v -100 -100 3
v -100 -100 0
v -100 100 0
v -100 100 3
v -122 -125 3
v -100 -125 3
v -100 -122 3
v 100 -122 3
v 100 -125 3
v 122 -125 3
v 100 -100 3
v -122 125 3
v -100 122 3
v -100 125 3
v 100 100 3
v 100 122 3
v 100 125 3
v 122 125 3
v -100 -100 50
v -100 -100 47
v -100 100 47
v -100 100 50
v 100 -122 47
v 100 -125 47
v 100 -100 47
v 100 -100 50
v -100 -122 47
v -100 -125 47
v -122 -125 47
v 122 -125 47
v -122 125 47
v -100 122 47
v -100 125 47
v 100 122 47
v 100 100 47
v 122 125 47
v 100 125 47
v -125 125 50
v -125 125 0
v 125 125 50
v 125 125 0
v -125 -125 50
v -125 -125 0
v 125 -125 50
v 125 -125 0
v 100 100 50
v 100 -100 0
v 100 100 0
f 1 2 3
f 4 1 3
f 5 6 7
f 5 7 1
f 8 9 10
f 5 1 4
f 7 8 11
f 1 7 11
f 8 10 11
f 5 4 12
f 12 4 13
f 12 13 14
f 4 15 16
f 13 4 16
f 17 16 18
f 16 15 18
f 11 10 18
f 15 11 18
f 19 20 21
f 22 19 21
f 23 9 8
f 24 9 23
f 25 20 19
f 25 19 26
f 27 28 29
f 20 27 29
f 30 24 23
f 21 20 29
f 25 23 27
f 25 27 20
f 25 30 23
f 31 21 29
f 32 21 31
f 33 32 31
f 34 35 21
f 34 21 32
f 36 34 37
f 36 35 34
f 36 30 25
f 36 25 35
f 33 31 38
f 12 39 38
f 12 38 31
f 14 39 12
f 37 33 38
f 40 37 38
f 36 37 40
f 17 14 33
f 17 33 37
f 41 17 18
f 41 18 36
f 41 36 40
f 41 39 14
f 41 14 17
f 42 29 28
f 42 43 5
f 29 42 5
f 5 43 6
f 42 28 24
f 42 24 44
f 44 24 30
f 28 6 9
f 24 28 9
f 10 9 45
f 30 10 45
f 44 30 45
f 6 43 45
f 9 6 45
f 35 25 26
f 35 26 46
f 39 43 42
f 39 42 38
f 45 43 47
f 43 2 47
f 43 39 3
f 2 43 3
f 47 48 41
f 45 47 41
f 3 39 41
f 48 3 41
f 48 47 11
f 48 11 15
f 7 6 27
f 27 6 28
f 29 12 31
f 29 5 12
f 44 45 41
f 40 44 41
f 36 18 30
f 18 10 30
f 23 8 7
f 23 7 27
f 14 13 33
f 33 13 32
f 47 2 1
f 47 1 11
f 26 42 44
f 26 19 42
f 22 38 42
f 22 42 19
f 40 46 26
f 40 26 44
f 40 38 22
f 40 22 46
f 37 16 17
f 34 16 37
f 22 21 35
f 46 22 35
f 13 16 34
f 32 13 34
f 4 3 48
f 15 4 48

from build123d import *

# Parameters (mm, degrees)
F0_W      = 250
F0_H      = 250
F0_W_2    = 200
F0_H_2    = 200
F1_DEPTH  = 50
F2_W      = 22
F2_H      = 44
F3_DEPTH  = 250
F6_W      = 25
F6_H      = 44
F7_DEPTH  = 125
F8_DEPTH  = 25
F9_DEPTH  = 25
F12_DEPTH = 122
F13_DEPTH = 122


# Not quite as in the source:
# - an extrude ends at something that could not be found from the text; its depth is read off the source's solid
# - a feature of the source that left no trace in its solid (it failed there, or was rolled back) is left out


with BuildPart() as f1:
    # F0 (on Top) → F1 (new body)
    with BuildSketch(Plane.XY):
        Rectangle(F0_W, F0_H)
        Rectangle(F0_W_2, F0_H_2, mode=Mode.SUBTRACT)
    extrude(amount=F1_DEPTH)

    # F2 (on face) → F3 (cut, through all)
    with BuildSketch(Plane.XZ.offset(125)):
        with Locations((-111, 25)):
            Rectangle(F2_W, F2_H)
        with Locations((111, 25)):
            Rectangle(F2_W, F2_H)
    extrude(amount=-F3_DEPTH, mode=Mode.SUBTRACT)

    # F6 (on Right) → F7 (cut, through all)
    with BuildSketch(Plane.YZ):
        with Locations((109.5, 25)):
            Rectangle(F6_W, F6_H)
        with Locations((-109.5, 25)):
            Rectangle(F6_W, F6_H)
    extrude(amount=-F7_DEPTH, mode=Mode.SUBTRACT)

    # F8 (add): a face of the model
    f8_faces = [f1.faces().sort_by_distance(p)[0] for p in [
        (-123.5, 97, 25),
    ]]
    extrude(f8_faces, amount=F8_DEPTH)

    # F9 (add): a face of the model
    f9_faces = [f1.faces().sort_by_distance(p)[0] for p in [
        (-123.5, -122, 25),
    ]]
    extrude(f9_faces, amount=F9_DEPTH)

    # F12 (cut, through all): a face of the model
    f12_faces = [f1.faces().sort_by_distance(p)[0] for p in [
        (0, -111, 25),
    ]]
    extrude(f12_faces, amount=-F12_DEPTH, mode=Mode.SUBTRACT)

    # F13 (cut, through all): a face of the model
    f13_faces = [f1.faces().sort_by_distance(p)[0] for p in [
        (0, 111, 25),
    ]]
    extrude(f13_faces, amount=-F13_DEPTH, mode=Mode.SUBTRACT)


solid = f1.part
